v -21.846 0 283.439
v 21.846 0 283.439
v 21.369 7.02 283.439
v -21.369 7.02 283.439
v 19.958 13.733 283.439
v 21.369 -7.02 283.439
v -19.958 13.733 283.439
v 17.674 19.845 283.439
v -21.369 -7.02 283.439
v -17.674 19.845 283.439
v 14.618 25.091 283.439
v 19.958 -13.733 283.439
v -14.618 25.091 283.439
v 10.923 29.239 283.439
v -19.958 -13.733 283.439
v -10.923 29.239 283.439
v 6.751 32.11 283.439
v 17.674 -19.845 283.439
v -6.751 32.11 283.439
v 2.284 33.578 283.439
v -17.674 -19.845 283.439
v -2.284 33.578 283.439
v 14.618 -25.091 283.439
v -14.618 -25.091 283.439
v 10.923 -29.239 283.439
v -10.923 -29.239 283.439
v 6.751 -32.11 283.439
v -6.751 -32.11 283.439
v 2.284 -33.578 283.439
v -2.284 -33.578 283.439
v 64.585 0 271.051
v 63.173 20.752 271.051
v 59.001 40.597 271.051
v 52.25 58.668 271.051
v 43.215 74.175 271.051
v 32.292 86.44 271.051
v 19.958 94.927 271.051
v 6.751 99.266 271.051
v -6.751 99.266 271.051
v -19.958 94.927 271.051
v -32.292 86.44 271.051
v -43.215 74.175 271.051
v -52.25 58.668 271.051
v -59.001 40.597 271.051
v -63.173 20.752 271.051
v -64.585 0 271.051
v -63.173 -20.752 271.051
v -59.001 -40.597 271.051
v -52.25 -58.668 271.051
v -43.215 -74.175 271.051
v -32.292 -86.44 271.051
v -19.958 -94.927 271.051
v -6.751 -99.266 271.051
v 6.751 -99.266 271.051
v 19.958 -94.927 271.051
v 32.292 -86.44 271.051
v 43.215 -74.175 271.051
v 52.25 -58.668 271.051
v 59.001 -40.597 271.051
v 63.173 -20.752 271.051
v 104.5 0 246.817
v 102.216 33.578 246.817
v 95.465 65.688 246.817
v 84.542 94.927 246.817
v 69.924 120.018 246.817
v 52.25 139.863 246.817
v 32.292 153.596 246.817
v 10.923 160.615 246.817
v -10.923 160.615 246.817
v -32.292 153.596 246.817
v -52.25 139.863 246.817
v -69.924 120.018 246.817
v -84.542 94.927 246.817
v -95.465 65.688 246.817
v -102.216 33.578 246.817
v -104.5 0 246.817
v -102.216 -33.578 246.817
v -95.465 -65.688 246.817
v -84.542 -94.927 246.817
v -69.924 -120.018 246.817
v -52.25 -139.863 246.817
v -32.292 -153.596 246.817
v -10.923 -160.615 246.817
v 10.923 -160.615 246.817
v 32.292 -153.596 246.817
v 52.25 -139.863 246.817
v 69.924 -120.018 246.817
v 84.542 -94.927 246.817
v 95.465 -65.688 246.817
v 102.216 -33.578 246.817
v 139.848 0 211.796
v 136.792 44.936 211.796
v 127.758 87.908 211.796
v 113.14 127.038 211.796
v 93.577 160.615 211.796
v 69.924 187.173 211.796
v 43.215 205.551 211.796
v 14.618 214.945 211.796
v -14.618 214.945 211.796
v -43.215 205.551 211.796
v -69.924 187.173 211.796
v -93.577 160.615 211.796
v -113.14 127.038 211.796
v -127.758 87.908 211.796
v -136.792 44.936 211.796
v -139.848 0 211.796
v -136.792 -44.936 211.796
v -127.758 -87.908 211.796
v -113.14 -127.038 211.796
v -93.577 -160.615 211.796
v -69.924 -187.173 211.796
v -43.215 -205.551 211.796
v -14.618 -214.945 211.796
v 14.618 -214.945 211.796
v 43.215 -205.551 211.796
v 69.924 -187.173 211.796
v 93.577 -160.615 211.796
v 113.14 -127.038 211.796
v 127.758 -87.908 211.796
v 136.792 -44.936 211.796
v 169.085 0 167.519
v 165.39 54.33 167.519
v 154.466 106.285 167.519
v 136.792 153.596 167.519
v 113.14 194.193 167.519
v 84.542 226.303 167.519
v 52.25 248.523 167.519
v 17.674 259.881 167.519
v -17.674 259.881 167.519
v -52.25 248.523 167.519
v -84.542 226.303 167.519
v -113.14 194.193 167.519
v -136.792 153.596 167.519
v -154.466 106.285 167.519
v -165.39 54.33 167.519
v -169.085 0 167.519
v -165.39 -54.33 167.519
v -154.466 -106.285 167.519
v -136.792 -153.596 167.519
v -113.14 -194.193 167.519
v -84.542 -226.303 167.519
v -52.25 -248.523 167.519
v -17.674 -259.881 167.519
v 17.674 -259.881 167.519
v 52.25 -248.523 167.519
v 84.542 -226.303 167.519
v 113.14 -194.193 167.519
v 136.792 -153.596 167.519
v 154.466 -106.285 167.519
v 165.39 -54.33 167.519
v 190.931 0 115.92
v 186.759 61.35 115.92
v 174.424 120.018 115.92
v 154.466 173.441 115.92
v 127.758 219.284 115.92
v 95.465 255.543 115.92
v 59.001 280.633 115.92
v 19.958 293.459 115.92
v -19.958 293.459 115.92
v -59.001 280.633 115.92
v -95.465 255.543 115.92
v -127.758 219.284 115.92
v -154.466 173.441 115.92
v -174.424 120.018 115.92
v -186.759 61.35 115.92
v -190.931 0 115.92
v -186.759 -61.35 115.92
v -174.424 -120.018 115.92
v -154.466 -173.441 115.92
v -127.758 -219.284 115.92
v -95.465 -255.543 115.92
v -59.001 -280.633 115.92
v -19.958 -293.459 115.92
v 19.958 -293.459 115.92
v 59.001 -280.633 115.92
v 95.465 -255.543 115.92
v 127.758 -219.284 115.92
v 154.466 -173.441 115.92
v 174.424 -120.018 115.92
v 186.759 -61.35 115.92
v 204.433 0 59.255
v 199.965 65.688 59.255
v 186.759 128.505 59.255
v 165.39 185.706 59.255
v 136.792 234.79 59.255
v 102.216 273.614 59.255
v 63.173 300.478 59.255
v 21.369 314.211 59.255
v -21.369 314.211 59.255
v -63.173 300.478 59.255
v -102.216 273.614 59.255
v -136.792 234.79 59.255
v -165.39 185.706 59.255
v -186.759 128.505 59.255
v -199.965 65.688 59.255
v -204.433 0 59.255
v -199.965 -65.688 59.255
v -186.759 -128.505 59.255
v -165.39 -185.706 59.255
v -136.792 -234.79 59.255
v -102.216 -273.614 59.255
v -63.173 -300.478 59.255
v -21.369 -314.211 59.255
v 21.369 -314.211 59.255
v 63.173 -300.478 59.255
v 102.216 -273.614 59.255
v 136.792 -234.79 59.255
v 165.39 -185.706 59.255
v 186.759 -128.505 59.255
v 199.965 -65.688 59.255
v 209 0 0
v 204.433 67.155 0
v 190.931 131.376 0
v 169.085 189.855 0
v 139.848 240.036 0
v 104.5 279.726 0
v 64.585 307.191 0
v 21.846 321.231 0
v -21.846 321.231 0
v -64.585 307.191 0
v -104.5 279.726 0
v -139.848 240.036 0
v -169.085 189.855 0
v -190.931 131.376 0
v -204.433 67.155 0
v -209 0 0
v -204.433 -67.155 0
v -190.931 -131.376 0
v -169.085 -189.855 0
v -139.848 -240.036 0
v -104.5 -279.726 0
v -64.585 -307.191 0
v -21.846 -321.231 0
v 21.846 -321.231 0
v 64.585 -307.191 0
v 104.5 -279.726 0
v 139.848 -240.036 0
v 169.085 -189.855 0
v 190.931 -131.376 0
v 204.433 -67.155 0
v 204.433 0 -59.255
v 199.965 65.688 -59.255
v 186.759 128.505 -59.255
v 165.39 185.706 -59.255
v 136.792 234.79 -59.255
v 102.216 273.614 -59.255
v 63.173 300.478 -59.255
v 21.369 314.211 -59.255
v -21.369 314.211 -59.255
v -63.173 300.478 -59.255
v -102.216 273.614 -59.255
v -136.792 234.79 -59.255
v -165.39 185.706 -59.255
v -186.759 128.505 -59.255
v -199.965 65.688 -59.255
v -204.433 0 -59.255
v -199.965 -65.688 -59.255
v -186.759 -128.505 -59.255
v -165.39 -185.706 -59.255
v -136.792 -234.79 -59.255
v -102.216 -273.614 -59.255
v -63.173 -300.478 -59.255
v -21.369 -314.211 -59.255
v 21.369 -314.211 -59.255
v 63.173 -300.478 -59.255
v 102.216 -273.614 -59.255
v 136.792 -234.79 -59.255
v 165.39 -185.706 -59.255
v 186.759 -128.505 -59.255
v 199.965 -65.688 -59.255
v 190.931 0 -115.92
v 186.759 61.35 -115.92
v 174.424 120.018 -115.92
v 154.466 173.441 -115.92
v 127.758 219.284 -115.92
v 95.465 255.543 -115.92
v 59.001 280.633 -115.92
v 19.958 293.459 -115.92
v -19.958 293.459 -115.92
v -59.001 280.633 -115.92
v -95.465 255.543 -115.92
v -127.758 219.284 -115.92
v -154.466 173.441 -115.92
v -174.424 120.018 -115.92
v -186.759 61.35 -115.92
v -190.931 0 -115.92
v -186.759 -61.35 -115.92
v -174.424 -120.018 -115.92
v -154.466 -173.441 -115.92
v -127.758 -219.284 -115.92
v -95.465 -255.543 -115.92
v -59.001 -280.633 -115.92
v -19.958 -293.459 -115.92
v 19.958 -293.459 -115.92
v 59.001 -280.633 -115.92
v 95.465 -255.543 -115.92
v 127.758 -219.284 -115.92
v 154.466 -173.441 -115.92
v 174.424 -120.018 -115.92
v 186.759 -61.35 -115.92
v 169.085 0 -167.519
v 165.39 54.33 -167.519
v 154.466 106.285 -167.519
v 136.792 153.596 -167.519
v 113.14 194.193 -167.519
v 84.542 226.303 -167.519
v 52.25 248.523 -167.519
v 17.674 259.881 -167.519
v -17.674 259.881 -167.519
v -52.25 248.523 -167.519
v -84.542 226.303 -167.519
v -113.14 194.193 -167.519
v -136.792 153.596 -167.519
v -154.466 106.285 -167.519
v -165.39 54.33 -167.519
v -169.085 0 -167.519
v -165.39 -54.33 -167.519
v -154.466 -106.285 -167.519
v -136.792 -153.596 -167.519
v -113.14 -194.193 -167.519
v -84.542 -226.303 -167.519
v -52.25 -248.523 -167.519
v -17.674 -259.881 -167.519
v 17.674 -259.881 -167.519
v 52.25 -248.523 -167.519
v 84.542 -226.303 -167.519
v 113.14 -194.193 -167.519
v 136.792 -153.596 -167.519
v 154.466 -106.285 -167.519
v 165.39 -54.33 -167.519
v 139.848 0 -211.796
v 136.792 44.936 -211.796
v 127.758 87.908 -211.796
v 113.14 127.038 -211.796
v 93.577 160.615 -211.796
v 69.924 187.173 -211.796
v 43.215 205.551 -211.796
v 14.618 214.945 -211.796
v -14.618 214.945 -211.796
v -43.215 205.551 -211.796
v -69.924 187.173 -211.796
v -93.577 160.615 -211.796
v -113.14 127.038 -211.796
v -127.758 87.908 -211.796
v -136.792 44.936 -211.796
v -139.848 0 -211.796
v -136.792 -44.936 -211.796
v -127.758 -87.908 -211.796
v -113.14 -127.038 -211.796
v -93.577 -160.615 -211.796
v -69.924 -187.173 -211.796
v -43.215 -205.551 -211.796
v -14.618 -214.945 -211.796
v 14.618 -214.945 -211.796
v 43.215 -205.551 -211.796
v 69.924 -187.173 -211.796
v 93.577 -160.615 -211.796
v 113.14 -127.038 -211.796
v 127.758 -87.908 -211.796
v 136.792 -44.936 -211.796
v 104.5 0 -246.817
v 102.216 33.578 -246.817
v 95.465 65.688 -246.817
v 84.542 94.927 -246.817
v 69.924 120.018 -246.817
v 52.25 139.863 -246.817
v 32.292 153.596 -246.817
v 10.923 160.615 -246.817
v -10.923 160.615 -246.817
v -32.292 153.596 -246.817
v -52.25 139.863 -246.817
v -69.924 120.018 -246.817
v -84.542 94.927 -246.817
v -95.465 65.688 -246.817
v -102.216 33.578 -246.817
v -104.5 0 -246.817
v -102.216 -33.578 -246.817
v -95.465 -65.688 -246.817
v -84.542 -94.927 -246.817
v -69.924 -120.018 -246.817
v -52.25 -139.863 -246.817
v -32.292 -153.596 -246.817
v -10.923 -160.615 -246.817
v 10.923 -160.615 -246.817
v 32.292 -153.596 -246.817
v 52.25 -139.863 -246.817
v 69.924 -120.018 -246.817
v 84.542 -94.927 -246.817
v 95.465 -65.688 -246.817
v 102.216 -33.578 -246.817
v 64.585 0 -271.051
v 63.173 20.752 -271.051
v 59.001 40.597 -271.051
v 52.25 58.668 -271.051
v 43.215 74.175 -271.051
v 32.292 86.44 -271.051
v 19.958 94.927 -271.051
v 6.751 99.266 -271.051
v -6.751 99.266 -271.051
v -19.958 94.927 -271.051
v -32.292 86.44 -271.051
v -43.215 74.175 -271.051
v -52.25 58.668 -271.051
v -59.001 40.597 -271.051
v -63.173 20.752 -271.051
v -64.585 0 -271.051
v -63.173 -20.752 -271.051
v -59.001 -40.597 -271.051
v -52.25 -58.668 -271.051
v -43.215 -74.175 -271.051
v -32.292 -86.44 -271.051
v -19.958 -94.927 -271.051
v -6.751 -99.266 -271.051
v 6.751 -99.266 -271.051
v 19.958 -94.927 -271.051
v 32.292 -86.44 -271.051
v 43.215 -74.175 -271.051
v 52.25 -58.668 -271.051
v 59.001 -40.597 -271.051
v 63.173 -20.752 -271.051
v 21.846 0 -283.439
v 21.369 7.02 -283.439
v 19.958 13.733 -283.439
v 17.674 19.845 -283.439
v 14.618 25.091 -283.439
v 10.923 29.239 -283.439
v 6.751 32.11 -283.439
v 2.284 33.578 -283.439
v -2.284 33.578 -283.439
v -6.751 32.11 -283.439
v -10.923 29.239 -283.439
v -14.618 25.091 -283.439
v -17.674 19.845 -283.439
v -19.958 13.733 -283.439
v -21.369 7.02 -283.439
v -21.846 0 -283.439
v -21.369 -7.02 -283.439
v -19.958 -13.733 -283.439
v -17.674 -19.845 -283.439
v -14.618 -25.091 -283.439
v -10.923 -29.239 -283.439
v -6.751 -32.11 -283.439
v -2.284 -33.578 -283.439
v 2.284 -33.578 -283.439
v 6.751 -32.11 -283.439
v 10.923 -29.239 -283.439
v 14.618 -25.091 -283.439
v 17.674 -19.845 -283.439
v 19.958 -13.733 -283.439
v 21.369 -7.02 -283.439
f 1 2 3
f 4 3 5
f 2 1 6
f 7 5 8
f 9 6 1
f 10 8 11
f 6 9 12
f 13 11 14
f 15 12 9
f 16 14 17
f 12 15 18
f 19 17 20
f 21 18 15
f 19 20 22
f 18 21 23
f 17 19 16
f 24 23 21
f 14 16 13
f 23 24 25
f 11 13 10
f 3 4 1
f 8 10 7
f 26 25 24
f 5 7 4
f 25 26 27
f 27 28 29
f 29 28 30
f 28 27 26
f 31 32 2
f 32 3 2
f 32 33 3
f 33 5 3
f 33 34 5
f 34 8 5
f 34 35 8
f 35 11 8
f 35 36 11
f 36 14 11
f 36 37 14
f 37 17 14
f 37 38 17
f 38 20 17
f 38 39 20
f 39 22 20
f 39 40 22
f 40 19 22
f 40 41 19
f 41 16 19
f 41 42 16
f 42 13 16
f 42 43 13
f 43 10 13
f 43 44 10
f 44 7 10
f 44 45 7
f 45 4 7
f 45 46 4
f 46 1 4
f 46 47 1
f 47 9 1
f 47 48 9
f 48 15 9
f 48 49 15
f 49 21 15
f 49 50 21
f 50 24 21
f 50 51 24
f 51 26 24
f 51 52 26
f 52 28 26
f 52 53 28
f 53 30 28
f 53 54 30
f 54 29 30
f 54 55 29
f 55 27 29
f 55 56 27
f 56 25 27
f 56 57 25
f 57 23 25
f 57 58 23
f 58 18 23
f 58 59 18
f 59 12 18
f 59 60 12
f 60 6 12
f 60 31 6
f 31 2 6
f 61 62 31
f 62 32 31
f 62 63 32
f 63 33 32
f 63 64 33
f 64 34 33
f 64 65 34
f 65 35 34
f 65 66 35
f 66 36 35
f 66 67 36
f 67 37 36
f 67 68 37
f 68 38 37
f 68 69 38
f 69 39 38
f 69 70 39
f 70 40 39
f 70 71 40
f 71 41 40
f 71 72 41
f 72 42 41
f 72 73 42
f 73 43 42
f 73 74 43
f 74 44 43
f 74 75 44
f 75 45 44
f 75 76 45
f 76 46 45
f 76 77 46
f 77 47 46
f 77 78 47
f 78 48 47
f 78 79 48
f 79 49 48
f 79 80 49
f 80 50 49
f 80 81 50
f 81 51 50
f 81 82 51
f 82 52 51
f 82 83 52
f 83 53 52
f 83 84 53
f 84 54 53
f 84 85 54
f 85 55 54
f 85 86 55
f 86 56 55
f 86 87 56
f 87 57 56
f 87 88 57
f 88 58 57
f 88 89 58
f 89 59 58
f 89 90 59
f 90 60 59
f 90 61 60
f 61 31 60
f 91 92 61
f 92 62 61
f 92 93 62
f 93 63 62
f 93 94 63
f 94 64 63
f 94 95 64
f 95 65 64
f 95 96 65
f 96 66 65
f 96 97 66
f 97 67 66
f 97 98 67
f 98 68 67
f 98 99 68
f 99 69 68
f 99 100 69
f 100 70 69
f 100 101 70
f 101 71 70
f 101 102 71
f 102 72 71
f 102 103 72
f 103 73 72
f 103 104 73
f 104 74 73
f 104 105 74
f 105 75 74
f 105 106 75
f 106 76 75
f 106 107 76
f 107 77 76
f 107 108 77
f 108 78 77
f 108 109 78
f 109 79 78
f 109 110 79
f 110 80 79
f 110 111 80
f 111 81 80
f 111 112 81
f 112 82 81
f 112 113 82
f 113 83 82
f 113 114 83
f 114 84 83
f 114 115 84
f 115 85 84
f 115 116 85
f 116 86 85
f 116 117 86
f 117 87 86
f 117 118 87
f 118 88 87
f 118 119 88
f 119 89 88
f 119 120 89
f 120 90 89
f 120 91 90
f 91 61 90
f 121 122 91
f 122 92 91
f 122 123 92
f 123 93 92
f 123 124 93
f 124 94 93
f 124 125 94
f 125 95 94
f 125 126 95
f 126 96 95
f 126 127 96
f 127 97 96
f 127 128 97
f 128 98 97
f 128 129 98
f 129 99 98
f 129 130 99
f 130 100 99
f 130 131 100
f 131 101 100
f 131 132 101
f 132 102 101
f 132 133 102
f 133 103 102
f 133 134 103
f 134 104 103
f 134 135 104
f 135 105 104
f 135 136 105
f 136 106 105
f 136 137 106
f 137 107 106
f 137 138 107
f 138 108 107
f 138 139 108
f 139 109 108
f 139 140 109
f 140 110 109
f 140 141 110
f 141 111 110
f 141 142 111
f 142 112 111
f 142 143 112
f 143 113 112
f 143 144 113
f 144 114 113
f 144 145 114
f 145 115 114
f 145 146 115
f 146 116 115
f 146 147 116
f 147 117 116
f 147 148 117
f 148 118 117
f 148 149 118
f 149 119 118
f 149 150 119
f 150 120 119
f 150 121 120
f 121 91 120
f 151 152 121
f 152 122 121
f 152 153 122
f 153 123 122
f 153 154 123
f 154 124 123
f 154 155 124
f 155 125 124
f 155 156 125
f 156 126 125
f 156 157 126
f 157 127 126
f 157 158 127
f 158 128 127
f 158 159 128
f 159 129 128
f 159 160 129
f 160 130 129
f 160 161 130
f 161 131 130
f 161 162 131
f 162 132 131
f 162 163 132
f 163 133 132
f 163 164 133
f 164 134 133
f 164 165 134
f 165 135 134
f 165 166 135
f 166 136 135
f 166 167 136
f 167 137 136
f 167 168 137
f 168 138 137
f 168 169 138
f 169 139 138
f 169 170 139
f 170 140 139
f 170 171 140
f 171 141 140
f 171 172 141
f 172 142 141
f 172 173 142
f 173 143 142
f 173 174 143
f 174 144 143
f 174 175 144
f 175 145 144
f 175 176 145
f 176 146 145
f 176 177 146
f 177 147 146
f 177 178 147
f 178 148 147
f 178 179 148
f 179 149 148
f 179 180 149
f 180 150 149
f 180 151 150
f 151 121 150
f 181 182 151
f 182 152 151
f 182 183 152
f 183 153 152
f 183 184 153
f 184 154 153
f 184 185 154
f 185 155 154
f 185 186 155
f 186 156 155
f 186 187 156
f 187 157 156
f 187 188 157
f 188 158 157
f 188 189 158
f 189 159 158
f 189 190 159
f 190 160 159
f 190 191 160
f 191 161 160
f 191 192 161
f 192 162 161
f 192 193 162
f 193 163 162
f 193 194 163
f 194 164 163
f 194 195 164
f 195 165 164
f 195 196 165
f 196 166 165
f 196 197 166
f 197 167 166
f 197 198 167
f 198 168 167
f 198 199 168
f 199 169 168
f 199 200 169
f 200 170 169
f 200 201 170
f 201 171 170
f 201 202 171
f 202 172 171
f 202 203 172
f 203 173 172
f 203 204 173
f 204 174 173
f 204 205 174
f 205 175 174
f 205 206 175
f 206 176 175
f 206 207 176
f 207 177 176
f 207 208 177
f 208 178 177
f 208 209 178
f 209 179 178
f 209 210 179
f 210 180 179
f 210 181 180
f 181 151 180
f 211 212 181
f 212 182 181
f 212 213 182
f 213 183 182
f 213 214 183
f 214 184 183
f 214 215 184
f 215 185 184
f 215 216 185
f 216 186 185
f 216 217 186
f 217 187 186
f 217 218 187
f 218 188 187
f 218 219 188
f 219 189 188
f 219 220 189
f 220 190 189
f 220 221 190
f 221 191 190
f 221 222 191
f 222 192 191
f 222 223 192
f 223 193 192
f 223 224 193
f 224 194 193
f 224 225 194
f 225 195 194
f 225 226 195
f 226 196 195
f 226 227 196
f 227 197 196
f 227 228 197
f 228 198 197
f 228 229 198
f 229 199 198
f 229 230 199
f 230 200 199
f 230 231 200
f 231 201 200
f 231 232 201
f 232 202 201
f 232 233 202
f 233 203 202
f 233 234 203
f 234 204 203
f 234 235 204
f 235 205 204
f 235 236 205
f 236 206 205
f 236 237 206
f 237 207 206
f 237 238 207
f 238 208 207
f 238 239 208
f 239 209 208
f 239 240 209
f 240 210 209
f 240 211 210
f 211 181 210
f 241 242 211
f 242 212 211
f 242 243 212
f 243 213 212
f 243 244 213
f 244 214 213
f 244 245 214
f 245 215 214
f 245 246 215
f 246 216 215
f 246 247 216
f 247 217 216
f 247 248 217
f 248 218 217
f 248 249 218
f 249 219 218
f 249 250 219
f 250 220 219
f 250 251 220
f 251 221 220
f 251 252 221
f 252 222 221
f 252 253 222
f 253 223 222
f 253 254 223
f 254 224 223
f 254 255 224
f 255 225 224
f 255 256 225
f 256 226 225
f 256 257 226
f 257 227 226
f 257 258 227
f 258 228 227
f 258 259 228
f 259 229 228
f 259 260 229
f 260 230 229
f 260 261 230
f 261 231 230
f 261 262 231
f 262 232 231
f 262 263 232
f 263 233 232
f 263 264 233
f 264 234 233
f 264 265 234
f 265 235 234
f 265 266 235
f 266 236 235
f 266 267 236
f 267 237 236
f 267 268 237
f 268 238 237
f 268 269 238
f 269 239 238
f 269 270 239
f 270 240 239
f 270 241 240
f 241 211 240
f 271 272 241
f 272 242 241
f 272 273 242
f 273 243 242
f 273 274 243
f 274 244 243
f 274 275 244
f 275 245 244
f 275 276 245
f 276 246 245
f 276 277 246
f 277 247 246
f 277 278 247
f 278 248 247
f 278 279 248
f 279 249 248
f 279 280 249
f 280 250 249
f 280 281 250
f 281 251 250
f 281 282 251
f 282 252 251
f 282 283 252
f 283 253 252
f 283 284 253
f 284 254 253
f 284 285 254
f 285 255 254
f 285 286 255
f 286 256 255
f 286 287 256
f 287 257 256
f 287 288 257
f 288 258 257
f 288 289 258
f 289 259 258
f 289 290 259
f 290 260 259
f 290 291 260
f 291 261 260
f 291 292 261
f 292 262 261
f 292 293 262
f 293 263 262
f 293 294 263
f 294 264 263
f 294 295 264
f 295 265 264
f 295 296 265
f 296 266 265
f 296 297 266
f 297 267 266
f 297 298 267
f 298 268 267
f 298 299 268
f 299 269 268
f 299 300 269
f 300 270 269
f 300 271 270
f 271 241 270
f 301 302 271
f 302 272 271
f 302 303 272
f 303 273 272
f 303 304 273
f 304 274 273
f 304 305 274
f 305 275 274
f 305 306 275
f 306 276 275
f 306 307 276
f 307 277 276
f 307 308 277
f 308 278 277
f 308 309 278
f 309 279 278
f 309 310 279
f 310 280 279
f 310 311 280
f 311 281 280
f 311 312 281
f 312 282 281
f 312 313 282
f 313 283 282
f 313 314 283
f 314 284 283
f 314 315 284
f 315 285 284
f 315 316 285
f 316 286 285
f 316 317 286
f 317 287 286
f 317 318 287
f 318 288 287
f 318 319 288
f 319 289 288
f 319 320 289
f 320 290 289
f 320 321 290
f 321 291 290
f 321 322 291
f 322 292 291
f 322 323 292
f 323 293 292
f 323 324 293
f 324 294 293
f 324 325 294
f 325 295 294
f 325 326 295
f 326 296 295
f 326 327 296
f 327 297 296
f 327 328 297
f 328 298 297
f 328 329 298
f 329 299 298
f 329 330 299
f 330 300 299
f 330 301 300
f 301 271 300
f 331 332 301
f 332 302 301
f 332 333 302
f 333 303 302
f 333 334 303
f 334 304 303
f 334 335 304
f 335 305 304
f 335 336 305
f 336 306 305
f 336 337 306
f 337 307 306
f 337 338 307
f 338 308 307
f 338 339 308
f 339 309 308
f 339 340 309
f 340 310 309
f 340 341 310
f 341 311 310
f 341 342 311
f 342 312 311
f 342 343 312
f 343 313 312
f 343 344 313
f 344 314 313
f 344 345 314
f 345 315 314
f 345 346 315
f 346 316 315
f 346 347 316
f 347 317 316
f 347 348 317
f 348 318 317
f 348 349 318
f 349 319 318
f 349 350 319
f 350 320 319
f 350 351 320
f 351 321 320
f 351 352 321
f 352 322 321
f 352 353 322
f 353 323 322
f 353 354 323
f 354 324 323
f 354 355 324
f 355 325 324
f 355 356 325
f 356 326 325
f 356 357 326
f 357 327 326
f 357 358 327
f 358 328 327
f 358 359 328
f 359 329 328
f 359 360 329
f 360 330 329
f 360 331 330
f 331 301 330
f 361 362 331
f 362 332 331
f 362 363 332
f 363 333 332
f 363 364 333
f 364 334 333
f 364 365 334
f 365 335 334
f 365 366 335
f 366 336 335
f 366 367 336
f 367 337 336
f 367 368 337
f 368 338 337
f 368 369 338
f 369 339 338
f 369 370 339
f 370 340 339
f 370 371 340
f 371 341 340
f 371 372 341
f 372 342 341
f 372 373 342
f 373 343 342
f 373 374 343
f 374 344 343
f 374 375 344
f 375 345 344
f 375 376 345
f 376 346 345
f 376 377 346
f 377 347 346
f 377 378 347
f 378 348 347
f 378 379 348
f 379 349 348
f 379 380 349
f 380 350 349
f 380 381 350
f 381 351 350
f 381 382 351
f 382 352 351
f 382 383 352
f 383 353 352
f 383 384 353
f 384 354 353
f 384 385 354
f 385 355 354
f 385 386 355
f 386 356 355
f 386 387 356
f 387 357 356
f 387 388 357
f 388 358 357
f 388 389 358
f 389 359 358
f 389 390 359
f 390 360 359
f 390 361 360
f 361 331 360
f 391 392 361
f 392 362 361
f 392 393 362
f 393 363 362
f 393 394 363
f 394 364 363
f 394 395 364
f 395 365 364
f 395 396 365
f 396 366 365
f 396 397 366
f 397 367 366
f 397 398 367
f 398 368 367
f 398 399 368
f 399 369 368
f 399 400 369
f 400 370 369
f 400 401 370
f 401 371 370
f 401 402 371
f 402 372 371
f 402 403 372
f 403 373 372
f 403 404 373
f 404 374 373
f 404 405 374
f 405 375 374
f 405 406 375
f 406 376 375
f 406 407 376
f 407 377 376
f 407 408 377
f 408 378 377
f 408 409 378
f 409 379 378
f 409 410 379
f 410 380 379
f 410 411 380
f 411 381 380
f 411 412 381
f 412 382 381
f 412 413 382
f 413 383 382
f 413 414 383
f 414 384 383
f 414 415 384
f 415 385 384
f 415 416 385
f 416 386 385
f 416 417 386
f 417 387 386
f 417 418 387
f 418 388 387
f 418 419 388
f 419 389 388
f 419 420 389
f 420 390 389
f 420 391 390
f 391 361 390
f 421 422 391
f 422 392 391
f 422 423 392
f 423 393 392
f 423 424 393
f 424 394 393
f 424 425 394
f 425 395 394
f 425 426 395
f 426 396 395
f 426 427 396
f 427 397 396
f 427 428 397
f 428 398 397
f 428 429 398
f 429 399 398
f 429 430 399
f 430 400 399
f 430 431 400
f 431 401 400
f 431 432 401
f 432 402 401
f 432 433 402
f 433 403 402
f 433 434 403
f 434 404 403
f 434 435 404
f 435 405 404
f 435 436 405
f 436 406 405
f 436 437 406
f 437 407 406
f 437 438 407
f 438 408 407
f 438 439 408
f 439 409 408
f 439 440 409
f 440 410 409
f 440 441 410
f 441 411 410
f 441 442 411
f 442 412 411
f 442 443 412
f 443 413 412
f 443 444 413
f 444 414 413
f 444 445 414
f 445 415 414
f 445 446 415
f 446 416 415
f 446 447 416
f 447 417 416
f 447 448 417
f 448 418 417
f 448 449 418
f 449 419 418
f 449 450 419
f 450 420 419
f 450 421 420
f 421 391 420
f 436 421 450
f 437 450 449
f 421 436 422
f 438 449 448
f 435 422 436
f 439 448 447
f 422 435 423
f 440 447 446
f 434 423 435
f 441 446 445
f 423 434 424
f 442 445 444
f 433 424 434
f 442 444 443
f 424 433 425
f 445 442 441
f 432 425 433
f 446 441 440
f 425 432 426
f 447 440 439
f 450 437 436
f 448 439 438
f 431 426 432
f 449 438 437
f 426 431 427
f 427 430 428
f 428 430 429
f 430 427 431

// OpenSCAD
// Generated by SolidPython 1.0.1 on 2020-07-29 00:46:50


scale(v = [11, 17, 15]) {
	sphere(r = 19);
}
/***********************************************
*********      SolidPython code:      **********
************************************************
 
# import packages: SolidPython
from solid import *
from solid.utils import *
from itertools import chain, combinations, permutations


class Resize:

    def __init__(self, scad_file):
        self.scad_file = scad_file
        #self.scad_file = import_scad(scad_file)
        # cone/cylinder param:
        self.r1 = 0
        self.r2 = 0
        self.h = 0
        # rectangular prism param:
        self.w = 0
        self.l = 0
        # ellipse param:
        self.r = 0

    # import OpenScad code (file name corresponds to shape)


    # classify shape + parameters
    def assign(self, param1, param2, param3):
        if self.scad_file == 'cone.scad':
            self.r1 = param1
            self.r2 = param2
            self.h = param3
        elif self.scad_file == 'cylinder.scad':
            self.r1 = param1
            self.r2 = param2
            self.h = param3
        elif self.scad_file == 'rectangularPrism.scad':
            self.h = param1
            self.l = param2
            self.w = param3
        else:
            self.r = param1
            self.h = param2

    # resize parameters
    def iterate(self):
        x = range(3, 20, 2)
        i = 1
        if self.scad_file == 'cone.scad':
            tempList = list(permutations(x, 2))
            for temp in tempList:
                param1 = temp[0]
                param2 = temp[1]
                filepath = 'produced_scad_files/' + 'cone' + str(param1) + '_' + str(param2) + '_' + '.scad'
                scad_render_to_file(cylinder(h=param1, r1=param2, r2=0), filepath)

        elif self.scad_file == 'cylinder.scad':
            tempList = list(permutations(x, 3))
            for temp in tempList:
                param1 = temp[0]
                param2 = temp[1]
                filepath = 'produced_scad_files/' + 'cylinder' + str(param1) + '_' + str(param2) + '_' + '.scad'
                scad_render_to_file(cylinder(h=param1, r1=param2, r2=param2), filepath)

        elif self.scad_file == 'rectangularPrism.scad':
            tempList = list(permutations(x, 3))
            for temp in tempList:
                param1 = temp[0]
                param2 = temp[1]
                param3 = temp[2]
                filepath = 'produced_scad_files/' + 'rectangularPrism' + str(param1) + '_' + str(param2) + '_' + str(
                    param3) + '.scad'
                scad_render_to_file(cube(size=(param1, param2, param3)), filepath)

        elif self.scad_file == 'ellipse.scad':
            tempList = list(permutations(x, 4))
            for temp in tempList:
                param1 = temp[0]
                param2 = temp[1]
                param3 = temp[2]
                param4 = temp[3]
                filepath = 'produced_scad_files/' + 'ellipse' + str(param1) + '_' + str(param2) + '_' + str(param3) + '_' + str(param4) + '.scad'
                scad_render_to_file(scale([param1, param2, param3])(sphere(r=param4)), filepath)

    def render_to_scadfile(self):
        scad_render_to_file(scad, 'example.scad') 
 
************************************************/
